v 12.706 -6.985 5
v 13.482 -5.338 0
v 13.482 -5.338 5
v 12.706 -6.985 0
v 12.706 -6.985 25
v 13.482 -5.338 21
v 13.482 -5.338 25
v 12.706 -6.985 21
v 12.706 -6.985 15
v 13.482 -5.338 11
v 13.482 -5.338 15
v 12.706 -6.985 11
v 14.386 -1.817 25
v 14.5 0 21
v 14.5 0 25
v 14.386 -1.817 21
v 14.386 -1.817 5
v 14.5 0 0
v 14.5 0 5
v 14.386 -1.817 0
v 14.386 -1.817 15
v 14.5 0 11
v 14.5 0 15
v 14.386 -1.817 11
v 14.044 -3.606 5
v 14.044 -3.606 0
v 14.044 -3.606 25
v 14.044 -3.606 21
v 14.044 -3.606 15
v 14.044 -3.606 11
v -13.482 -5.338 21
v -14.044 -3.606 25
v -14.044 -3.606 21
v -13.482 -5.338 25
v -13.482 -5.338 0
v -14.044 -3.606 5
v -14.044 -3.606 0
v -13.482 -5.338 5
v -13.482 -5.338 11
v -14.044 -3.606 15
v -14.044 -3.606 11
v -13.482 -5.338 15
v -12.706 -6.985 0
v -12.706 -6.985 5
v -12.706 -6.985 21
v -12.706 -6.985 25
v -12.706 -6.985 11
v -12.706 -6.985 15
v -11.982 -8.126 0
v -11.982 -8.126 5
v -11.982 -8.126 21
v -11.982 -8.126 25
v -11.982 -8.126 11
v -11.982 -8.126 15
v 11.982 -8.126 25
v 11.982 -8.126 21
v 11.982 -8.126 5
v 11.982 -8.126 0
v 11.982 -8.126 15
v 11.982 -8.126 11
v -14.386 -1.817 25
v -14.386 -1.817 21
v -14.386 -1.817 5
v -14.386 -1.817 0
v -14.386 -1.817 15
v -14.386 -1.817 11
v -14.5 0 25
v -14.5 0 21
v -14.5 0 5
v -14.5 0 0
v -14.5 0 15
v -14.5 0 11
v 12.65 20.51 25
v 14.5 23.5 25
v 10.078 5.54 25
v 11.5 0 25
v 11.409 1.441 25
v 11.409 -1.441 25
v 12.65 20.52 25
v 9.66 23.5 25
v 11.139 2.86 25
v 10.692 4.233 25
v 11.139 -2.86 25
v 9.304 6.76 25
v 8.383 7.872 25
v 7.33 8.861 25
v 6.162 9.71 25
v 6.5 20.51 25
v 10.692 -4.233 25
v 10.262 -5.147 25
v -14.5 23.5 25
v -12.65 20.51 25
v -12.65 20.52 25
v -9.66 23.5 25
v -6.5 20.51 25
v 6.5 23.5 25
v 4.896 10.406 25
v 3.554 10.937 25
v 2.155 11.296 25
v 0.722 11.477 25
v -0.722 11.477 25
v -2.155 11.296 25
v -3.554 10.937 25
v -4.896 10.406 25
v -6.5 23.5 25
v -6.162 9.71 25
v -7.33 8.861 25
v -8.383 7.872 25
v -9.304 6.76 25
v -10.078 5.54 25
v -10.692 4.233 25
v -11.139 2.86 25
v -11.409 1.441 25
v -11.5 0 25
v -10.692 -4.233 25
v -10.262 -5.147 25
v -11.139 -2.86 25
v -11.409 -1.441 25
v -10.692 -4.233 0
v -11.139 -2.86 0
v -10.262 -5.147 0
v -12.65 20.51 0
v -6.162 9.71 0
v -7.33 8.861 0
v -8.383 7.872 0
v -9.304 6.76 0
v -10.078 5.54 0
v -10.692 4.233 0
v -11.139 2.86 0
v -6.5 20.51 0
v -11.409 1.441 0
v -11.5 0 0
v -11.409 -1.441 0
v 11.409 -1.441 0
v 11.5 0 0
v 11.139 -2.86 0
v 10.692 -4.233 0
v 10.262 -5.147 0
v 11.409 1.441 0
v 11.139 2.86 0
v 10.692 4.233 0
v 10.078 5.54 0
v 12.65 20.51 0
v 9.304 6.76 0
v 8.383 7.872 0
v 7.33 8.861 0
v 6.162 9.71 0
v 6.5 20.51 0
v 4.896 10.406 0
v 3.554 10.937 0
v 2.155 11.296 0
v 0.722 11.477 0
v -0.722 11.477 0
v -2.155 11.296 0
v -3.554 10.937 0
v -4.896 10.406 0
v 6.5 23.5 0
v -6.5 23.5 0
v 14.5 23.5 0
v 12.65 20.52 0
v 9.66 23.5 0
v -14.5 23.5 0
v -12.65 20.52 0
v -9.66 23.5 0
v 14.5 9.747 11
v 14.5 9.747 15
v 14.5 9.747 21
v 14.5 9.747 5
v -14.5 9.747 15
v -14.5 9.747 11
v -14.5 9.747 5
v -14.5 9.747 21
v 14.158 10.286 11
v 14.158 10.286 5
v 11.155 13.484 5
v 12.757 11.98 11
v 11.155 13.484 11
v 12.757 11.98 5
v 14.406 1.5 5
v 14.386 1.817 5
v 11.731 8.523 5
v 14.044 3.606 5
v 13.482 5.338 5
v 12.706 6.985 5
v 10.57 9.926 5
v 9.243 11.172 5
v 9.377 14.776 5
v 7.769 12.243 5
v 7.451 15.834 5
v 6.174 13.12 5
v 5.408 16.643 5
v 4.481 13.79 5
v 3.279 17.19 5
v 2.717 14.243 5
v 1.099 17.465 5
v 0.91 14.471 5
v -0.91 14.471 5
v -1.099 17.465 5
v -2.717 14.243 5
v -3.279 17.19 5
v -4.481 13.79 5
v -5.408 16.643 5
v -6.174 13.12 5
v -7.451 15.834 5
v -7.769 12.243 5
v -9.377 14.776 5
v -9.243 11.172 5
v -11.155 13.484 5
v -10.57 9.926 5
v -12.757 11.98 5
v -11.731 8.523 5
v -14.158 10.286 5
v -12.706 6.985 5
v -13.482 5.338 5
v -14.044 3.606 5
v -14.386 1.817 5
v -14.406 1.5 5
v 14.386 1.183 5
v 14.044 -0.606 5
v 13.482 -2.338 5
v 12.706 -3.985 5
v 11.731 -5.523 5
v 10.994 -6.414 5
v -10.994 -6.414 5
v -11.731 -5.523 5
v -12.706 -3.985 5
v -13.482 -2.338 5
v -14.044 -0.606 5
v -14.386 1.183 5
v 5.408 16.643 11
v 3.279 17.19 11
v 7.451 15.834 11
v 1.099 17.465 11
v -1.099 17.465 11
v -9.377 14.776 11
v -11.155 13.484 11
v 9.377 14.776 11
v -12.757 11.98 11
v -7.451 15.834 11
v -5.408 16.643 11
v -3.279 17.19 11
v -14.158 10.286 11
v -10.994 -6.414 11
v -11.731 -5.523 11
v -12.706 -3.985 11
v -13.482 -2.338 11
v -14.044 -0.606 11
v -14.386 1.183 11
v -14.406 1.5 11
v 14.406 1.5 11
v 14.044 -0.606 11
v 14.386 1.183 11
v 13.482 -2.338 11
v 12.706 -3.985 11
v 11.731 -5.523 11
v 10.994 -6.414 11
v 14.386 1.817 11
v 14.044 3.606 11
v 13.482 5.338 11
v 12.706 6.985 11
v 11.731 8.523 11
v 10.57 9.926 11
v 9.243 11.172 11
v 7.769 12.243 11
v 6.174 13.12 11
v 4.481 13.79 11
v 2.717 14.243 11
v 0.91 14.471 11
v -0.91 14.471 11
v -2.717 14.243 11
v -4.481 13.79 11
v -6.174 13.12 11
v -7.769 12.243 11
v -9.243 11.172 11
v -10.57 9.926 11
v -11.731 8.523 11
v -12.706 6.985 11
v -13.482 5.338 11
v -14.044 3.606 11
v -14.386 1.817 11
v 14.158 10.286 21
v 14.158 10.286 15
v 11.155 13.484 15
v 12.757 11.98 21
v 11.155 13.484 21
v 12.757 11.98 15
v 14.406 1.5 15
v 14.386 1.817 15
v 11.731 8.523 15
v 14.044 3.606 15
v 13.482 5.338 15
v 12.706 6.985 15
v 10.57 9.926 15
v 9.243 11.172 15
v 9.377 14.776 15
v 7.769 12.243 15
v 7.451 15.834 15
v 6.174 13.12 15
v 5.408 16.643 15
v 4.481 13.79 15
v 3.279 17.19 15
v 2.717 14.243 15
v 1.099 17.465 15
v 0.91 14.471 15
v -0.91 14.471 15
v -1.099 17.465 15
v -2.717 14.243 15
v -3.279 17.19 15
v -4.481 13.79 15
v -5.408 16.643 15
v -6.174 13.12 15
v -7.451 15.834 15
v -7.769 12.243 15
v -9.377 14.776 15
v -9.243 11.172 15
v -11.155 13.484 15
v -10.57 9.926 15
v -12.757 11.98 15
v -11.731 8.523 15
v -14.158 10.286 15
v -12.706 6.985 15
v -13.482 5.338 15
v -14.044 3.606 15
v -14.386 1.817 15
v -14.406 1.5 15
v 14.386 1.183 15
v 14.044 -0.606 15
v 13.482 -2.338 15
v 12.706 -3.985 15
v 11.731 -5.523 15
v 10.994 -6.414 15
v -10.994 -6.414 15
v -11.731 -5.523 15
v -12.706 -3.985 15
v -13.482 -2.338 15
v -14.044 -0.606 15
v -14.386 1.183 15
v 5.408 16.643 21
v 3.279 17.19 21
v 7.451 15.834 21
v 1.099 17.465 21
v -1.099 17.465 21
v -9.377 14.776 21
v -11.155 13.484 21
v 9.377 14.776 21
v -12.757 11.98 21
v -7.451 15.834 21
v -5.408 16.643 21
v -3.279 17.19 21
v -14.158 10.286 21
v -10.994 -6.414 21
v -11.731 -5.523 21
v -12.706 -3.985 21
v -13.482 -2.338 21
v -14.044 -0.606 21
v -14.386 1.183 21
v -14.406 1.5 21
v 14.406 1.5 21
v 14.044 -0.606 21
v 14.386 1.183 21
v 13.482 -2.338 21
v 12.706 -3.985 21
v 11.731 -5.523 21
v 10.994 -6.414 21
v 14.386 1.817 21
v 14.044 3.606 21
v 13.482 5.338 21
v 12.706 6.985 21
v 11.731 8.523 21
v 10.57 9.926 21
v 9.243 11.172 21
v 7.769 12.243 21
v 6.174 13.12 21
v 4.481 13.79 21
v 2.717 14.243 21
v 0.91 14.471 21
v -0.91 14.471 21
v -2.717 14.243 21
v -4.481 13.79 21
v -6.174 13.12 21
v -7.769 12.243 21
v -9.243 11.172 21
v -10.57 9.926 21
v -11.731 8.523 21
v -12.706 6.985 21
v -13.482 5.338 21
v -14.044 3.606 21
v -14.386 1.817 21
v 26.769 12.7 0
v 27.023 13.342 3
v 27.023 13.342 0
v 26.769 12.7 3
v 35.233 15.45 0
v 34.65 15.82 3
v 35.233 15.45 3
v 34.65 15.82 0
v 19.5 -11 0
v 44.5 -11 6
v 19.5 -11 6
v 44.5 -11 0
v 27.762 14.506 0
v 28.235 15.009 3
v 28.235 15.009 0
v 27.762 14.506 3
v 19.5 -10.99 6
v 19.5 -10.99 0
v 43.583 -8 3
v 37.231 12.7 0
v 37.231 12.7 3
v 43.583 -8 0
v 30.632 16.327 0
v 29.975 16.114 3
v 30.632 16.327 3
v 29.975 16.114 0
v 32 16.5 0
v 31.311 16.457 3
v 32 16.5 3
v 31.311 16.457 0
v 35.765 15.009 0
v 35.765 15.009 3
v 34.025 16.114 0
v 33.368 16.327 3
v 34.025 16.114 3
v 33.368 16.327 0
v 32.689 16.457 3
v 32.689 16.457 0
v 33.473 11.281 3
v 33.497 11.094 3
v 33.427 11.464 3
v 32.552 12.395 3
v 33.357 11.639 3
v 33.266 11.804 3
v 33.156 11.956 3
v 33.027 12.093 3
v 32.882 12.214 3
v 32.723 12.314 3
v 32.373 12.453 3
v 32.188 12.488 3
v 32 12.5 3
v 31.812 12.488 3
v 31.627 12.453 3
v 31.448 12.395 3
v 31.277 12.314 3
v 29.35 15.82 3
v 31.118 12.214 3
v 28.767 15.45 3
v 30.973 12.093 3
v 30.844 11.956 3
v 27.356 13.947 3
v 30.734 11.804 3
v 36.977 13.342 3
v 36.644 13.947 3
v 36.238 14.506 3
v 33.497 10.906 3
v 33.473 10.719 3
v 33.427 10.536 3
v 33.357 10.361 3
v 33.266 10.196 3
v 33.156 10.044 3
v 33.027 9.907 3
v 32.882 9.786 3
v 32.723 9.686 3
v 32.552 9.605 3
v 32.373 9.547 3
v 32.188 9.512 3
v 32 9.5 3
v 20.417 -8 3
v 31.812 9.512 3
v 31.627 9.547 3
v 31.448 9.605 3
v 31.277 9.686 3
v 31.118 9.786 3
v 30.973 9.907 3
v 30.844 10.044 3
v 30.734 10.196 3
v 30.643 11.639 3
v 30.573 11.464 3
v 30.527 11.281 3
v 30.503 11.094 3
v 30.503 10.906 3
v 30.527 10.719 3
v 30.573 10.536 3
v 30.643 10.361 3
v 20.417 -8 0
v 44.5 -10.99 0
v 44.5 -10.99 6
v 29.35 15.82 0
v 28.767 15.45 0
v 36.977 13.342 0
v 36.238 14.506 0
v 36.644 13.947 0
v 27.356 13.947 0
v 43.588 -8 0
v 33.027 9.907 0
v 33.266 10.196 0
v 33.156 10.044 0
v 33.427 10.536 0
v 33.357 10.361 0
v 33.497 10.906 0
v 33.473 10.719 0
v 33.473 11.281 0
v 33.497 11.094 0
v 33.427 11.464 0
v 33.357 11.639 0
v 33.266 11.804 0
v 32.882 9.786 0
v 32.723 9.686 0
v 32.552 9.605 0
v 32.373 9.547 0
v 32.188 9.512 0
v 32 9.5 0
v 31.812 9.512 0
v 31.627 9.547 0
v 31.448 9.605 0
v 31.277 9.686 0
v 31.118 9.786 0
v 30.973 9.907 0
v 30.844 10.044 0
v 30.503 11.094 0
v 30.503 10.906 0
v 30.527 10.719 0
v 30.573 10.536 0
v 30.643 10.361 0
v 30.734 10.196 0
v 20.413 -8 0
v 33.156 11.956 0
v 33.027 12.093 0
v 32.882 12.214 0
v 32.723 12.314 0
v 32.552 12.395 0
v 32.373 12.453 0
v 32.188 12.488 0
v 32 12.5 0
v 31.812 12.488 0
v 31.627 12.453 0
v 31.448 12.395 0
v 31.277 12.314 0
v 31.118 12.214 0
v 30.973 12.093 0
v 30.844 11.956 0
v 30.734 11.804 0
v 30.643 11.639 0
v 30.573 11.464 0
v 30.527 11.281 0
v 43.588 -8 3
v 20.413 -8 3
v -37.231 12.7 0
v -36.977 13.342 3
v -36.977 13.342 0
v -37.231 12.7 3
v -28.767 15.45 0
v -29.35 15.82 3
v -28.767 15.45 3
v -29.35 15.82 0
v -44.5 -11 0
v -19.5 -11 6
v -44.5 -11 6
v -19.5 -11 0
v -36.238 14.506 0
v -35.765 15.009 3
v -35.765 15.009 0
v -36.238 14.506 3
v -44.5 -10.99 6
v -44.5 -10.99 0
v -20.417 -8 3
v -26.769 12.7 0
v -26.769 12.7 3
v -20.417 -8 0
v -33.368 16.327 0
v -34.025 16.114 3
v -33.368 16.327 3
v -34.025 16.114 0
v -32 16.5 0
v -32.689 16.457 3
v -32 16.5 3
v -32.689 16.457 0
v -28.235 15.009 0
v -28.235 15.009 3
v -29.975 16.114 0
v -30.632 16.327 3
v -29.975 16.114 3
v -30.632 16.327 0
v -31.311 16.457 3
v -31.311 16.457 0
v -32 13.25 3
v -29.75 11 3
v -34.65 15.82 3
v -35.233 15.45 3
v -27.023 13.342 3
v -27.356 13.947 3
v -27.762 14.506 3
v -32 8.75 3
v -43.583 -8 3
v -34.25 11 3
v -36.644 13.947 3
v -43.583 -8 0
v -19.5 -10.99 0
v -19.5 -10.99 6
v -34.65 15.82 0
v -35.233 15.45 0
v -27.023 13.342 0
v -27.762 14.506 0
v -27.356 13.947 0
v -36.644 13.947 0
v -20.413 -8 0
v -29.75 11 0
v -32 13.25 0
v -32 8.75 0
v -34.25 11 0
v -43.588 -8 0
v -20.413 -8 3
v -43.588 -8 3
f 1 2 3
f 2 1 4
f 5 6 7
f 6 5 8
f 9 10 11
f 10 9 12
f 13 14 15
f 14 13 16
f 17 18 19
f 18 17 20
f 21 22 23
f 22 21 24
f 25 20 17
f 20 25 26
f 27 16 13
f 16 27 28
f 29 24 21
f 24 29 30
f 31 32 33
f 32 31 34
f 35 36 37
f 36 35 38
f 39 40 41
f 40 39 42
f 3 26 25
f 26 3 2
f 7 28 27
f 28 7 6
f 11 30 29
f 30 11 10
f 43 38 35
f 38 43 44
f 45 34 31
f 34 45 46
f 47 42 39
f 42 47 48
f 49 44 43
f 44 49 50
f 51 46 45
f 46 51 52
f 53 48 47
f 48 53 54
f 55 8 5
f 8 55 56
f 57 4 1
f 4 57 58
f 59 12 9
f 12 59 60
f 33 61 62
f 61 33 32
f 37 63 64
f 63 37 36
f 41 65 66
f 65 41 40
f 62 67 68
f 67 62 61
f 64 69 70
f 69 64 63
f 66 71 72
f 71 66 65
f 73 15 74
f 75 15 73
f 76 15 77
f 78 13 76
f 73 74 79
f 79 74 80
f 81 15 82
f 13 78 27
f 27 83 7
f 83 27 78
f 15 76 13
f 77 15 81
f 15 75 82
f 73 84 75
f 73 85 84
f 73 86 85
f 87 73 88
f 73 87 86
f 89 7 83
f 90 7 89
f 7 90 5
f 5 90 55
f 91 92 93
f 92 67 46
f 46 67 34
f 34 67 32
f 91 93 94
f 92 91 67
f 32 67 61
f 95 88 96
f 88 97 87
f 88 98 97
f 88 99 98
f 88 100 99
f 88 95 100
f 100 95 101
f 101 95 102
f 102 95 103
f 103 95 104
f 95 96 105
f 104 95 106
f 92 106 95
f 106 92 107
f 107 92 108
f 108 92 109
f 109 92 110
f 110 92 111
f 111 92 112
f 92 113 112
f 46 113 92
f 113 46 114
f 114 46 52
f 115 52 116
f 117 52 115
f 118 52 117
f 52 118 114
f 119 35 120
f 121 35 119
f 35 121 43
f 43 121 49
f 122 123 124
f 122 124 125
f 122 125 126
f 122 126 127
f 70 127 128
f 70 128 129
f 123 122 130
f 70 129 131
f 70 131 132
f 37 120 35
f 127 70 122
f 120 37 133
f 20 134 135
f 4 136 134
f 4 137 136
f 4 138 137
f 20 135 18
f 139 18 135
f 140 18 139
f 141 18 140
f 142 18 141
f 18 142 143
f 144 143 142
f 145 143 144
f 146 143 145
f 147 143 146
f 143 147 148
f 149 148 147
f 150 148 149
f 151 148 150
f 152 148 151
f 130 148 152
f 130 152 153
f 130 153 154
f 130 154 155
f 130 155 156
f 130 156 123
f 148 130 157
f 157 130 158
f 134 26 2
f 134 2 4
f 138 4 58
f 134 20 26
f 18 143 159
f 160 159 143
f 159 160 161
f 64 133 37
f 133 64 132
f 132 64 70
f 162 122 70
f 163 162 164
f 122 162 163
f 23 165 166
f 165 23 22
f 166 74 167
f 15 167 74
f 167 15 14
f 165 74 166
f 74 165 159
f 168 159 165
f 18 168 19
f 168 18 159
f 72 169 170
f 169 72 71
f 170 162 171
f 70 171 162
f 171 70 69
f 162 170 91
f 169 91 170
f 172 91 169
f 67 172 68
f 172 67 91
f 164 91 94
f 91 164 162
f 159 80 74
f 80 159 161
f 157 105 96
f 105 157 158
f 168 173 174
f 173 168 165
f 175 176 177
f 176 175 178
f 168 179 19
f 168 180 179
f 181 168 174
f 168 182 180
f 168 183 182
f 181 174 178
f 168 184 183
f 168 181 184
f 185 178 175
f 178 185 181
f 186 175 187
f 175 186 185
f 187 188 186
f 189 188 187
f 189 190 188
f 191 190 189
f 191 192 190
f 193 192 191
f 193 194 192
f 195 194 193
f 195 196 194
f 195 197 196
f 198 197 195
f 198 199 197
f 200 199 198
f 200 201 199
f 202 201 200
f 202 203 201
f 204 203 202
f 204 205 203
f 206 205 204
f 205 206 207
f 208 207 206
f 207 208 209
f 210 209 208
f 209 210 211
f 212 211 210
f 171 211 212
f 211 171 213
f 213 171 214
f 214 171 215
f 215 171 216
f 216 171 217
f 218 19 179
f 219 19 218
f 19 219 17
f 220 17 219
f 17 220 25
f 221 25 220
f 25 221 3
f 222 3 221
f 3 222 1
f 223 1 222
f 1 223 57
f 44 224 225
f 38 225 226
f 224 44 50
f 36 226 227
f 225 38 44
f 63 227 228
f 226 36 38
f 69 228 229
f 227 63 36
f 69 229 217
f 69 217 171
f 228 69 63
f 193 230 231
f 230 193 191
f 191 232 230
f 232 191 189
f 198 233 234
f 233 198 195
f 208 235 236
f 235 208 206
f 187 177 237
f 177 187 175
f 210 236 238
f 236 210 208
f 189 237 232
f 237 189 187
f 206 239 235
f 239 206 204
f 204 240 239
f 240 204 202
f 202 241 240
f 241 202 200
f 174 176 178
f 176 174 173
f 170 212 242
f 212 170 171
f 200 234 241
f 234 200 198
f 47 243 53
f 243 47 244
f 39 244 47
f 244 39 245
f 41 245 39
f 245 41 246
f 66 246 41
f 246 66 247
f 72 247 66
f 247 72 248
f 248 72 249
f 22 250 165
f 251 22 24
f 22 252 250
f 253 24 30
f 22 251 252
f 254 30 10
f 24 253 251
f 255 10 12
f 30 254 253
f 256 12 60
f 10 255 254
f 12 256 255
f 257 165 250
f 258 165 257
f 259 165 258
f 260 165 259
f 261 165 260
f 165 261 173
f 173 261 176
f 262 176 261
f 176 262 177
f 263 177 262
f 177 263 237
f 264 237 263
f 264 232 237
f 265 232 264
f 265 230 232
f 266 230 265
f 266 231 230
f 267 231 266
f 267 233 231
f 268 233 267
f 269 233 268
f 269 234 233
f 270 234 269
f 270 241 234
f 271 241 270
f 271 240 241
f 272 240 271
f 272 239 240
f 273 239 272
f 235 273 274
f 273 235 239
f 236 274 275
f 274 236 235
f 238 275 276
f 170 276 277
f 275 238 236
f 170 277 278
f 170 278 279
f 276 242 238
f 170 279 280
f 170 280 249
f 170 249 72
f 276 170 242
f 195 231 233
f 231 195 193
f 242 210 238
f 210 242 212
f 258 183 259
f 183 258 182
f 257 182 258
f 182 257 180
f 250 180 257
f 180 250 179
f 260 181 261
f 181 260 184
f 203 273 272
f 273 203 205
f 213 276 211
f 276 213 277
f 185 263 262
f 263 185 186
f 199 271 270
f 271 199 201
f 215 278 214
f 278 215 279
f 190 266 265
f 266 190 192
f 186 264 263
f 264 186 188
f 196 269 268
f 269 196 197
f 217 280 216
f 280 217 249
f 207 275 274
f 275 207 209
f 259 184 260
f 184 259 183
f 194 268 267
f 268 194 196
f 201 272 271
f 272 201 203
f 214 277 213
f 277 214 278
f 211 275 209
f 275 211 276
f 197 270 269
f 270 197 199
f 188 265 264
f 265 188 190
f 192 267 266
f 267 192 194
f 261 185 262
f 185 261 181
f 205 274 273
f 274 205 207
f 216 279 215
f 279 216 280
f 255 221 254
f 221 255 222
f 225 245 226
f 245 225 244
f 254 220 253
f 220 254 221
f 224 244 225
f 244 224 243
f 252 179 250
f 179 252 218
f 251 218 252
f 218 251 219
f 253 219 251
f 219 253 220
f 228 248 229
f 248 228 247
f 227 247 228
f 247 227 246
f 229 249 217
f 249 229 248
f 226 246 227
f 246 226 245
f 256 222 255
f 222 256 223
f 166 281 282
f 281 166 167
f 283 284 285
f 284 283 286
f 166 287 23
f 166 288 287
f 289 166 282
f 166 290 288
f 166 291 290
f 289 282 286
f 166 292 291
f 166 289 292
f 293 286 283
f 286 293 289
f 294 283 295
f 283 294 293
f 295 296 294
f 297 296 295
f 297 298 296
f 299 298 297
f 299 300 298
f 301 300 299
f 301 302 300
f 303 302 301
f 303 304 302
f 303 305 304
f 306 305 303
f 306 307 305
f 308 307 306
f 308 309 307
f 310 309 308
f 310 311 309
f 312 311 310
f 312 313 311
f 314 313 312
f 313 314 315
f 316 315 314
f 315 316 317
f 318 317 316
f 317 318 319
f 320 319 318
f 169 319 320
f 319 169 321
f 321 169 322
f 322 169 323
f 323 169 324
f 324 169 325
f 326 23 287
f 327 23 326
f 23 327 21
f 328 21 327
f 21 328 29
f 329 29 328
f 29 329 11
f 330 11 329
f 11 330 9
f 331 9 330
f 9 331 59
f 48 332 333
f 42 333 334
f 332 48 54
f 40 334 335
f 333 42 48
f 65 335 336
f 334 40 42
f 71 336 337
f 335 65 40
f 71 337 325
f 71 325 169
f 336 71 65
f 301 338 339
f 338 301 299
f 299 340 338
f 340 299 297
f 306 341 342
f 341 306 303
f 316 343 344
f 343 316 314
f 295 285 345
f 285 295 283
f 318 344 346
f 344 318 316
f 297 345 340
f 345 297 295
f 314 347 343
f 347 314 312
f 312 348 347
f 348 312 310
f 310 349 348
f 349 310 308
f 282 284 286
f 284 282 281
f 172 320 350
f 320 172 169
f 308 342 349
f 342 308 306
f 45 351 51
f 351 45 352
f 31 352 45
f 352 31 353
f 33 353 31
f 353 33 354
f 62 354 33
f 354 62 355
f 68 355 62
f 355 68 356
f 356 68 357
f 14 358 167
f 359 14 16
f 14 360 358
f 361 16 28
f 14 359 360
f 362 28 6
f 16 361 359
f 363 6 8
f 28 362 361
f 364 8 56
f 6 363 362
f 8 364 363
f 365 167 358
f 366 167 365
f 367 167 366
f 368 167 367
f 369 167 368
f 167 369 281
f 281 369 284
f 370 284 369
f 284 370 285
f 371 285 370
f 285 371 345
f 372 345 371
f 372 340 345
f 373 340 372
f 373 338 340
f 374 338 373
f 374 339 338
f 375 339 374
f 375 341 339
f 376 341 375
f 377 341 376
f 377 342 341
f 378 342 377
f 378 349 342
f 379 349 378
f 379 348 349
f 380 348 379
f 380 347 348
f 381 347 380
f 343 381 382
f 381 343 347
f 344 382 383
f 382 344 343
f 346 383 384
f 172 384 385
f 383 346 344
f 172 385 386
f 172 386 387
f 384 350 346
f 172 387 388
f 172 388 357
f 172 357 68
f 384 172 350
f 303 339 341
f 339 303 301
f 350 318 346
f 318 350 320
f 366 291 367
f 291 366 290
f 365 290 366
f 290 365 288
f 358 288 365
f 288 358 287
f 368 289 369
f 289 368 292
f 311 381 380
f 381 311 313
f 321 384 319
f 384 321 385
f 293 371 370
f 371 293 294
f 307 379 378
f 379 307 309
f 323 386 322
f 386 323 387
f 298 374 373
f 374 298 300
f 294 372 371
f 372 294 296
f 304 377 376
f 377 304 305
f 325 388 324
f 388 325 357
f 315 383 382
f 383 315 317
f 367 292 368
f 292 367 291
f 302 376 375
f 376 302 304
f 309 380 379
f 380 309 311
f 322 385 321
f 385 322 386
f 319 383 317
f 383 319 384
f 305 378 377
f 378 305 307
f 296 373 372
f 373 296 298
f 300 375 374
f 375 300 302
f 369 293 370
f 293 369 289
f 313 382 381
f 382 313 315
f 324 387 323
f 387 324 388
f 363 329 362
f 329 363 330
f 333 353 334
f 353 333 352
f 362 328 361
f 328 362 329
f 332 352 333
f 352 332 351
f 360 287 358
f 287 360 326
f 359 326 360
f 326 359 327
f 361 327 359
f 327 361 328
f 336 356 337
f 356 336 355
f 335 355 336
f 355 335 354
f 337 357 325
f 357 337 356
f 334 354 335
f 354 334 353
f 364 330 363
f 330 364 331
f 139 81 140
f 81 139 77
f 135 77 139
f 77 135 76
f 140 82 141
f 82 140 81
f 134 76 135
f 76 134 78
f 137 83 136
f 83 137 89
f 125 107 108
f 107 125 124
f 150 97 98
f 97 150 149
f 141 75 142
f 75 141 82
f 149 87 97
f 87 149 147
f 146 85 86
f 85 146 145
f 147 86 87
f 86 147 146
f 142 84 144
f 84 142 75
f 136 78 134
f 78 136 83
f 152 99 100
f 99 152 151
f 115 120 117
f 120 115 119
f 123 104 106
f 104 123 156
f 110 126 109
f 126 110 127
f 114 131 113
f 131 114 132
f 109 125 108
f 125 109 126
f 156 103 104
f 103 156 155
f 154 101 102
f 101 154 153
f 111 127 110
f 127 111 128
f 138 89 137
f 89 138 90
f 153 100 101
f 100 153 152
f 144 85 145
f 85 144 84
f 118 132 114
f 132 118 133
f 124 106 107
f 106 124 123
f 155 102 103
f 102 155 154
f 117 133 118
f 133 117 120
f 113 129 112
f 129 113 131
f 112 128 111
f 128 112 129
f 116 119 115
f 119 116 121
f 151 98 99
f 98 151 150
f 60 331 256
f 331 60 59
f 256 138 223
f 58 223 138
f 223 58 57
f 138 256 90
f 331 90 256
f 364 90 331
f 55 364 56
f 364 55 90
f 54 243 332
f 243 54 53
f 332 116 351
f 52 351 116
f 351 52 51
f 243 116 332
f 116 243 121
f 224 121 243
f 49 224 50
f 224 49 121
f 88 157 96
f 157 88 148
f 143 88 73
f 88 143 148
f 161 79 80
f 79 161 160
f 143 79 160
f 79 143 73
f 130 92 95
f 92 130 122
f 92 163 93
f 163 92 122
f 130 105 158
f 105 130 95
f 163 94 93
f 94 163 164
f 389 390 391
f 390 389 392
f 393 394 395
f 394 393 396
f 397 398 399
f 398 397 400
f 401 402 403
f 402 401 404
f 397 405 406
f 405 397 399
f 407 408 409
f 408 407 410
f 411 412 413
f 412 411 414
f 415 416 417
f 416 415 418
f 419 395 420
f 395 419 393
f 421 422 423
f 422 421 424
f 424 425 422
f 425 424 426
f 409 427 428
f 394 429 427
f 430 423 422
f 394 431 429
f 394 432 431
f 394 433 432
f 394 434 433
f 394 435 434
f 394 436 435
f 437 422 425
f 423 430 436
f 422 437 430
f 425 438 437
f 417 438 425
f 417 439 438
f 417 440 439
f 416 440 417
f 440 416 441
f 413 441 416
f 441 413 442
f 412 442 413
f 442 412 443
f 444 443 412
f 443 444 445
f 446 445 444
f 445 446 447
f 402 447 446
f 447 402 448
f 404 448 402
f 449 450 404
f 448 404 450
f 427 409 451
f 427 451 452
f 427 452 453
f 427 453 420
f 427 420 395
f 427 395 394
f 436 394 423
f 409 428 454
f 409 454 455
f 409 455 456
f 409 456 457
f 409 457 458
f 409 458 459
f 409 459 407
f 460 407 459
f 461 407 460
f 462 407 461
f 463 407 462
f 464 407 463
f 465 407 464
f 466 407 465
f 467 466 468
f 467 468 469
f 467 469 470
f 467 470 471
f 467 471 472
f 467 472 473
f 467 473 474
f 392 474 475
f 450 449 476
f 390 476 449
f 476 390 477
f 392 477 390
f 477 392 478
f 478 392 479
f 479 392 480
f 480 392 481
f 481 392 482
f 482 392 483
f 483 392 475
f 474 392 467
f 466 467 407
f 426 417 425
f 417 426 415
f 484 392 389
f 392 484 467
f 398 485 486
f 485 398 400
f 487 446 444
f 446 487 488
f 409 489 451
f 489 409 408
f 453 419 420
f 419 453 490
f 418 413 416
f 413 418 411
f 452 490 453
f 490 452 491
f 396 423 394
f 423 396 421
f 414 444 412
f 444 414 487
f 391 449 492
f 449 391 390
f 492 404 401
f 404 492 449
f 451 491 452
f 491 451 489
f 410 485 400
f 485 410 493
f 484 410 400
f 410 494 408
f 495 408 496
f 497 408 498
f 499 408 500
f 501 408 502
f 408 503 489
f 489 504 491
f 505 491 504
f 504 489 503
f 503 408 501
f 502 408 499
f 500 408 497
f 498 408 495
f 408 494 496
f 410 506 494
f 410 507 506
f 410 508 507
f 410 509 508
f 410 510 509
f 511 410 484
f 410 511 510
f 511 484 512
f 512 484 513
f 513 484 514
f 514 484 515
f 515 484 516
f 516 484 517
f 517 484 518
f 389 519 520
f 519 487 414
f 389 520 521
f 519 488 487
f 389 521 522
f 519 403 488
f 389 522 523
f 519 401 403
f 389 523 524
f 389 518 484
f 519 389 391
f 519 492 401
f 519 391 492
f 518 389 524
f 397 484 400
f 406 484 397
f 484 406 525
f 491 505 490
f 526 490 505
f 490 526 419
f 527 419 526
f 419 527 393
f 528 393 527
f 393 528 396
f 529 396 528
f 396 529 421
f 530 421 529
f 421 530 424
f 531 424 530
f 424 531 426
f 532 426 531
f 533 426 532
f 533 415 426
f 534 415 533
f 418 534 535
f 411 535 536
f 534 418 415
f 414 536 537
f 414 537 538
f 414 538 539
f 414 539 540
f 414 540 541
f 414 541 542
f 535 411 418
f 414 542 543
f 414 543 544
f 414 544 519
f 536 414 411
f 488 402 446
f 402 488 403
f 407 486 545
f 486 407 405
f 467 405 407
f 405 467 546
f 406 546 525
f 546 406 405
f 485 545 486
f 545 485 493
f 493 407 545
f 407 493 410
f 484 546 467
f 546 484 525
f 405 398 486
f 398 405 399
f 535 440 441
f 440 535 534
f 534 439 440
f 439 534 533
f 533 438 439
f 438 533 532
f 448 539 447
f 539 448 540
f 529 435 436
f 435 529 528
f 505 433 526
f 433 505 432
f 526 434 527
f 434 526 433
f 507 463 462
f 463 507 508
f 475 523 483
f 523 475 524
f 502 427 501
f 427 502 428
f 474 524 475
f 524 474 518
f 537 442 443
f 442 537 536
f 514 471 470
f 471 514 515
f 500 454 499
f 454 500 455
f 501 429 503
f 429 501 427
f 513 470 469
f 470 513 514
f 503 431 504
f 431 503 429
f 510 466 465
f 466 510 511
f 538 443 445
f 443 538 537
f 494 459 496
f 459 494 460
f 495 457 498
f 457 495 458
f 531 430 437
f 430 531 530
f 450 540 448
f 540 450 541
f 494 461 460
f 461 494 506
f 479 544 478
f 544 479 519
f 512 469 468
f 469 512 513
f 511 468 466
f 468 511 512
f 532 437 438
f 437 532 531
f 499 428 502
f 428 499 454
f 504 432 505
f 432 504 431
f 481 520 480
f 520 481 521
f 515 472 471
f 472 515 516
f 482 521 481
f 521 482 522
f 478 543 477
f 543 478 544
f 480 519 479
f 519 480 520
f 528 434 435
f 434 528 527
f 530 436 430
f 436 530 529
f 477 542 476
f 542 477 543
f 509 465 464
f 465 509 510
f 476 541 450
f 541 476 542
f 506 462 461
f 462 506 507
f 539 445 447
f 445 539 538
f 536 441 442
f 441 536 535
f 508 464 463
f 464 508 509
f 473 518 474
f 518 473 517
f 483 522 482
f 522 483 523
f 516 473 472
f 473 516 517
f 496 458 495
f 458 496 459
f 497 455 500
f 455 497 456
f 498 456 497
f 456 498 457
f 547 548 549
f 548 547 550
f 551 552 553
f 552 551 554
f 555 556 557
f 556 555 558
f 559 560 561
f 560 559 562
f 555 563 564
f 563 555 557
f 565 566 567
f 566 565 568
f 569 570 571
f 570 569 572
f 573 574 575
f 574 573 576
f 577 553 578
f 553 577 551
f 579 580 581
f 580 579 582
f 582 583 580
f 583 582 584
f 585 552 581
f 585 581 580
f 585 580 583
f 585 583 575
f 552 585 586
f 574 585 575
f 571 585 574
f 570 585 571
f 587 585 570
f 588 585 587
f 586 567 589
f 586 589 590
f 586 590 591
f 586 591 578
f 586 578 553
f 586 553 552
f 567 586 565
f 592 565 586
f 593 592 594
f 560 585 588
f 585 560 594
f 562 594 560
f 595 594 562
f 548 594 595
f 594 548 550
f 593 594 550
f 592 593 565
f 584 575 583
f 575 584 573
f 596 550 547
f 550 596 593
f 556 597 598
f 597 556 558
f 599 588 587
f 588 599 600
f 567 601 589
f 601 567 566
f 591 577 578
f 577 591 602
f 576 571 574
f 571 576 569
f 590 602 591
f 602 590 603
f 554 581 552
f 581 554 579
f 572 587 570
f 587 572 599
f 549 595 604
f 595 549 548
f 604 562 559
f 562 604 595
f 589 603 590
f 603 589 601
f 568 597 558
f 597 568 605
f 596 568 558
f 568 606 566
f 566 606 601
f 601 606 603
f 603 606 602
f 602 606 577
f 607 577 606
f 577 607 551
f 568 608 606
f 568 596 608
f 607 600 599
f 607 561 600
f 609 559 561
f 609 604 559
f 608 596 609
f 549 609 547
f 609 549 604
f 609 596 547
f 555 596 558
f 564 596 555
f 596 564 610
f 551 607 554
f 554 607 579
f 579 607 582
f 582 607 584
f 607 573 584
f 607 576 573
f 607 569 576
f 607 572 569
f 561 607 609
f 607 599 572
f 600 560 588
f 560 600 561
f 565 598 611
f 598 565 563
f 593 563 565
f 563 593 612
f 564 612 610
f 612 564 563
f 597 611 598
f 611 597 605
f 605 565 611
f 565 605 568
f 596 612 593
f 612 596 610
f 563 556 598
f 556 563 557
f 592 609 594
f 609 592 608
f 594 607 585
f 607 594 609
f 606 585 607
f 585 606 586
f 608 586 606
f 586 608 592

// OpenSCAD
/*
 * dash-cam mirror bracket
 * Replaces the suction cup on a ROVE R2-4K cam that eventually
 * fails from heat, even though it works relatively well for
 * a year or two.
 *
 * The clip for the mirror post is sized for the mirror in a 2020 Tundra
 */
preview=false;  // otherwise use print layout (separate parts)

mirrorPostDia=23;
mirrorClipWidth=25;
mirrorClipThickness=3;
mirrorClipBlockExtraHeight=9;
mirrorClipBlockWidth=mirrorPostDia+mirrorClipThickness*2;
mirrorClipBlockHeight=mirrorClipBlockWidth/2+mirrorClipBlockExtraHeight;

clampHingeBaseWidth=mirrorClipWidth;
clampHingeGapWidth=13;
clampHingeAxleHeight=22;
clampHingeAxleOuterDia=11;  // thumbscrew outer dia is 11.6
clampHingePlateThickness=3;
clampHingeAxleInnerDia=3;
//clampHingeNutInsetDia=8.75;
clampHingeSquareDia=4.5; // This is the diagonal, corner-to-corner

clampHingeDovetailDepth=clampHingePlateThickness;
clampHingeDovetailThickness=clampHingePlateThickness;
clampHingeSlotTolerance=0.15;

tieWrapWidth=6;
tieWrapThickness=3;


overlap=0.01;
$fn=50;

if (preview) {
    printPartClip();
    translate([0,mirrorClipBlockHeight-clampHingeDovetailDepth,clampHingeBaseWidth/2])
        mirror([1,0,0]) rotate([0,0,90])
            translate([0,clampHingeGapWidth/2,0]) // center gap on axis
                rotate([-90,0,0])  // turn sideways
        printPartAxlePlateLeft();
    translate([0,mirrorClipBlockHeight-clampHingeDovetailDepth,clampHingeBaseWidth/2])
        rotate([0,0,90])
            translate([0,clampHingeGapWidth/2,0]) // center gap on axis
                rotate([-90,0,0])  // turn sideways
                    printPartAxlePlateRight();
} else {
    spacing=5;
    printPartClip();
    translate([mirrorClipBlockWidth/2+clampHingeBaseWidth/2+spacing,-clampHingeAxleHeight/2,0]) rotate([0,0,90])
        printPartAxlePlateLeft();
    translate([-mirrorClipBlockWidth/2-clampHingeBaseWidth/2-spacing,-clampHingeAxleHeight/2,0]) rotate([0,0,90])
    printPartAxlePlateRight();

}

module printPartClip() {
    difference() {
        postClip(mirrorPostDia, mirrorClipWidth, mirrorClipThickness, mirrorClipBlockHeight, mirrorClipBlockWidth);
        // dovetail slot 1
        translate([clampHingeGapWidth/2,mirrorClipBlockHeight-clampHingeDovetailDepth+overlap,clampHingeBaseWidth/2]) rotate([-90,0,0])
            clampHingeDovetail(clampHingePlateThickness+clampHingeSlotTolerance, 
                clampHingeBaseWidth+2, 
                clampHingeDovetailThickness, 
                clampHingeDovetailDepth, 0, 0);
        // dovetail slot 2
        translate([-clampHingeGapWidth/2,mirrorClipBlockHeight-clampHingeDovetailDepth+overlap,clampHingeBaseWidth/2]) mirror([1,0,0]) rotate([-90,0,0])
            clampHingeDovetail(clampHingePlateThickness+clampHingeSlotTolerance, 
            clampHingeBaseWidth+2, 
            clampHingeDovetailThickness, 
            clampHingeDovetailDepth, 0, 0);
    }
}

module printPartAxlePlateRight() {
    clampHinge(clampHingeBaseWidth,clampHingeAxleHeight,
        clampHingeAxleOuterDia, clampHingePlateThickness,
        clampHingeAxleInnerDia, clampHingeSquareDia);
}

module printPartAxlePlateLeft() {
    clampHinge(clampHingeBaseWidth,clampHingeAxleHeight,
        clampHingeAxleOuterDia, clampHingePlateThickness,
        clampHingeAxleInnerDia, 0);
}

/*
 * This creates once side-plate for the hinge, If hingeSquareDia is not zero, the hole in the flange
 * will be cut square for the anti-rotation square-shaft portion of the axle bolt (just below the "head"),
 * carriage-bolt style.
 * Note: Design on ROVE is reversed from a fixed nut recess.  The thumbscrew has a nut embedded in it,
 * and the bolt/shaft does not rotate relative to the hinge.
 */
module clampHinge(baseWidth, axleHeight, axleOuterDia, plateThickness, 
        axleInnerDia, hingeSquareDia) {
    difference() {
        // screw (head with square insert) side
        union() {
            hull() {
                // axle (top) corner
                translate([axleHeight,0,0])
                    cylinder(d=axleOuterDia, h=plateThickness);
                translate([0,-baseWidth/2,0])
                    cube([overlap,overlap,plateThickness]);
                translate([0,baseWidth/2-overlap,0])
                    cube([overlap,overlap,plateThickness]);
            }
            // Dovetail insert 
            mirror([1,0,0]) rotate([0,-90,0])
                clampHingeDovetail(plateThickness, baseWidth, clampHingeDovetailThickness, clampHingeDovetailDepth, 0, 0.073);
        }
        // axle cut
        translate([axleHeight,0,-overlap])
            if (hingeSquareDia)
                cylinder(d=hingeSquareDia, h=plateThickness+overlap*3, $fn=4);
            else 
                cylinder(d=axleInnerDia, h=plateThickness+overlap*3);
    }
}

/**
 * Assembled centered along y-axis, in +x, +z quadrant
 * (overlaps thickness of the plate)
 */
module clampHingeDovetail(overlapThickness, baseWidth, rootThickness, edgeDepth, enlargementFactor=0, taperFactor) {
    translate([0,-baseWidth/2,0])
        hull() {
            // root/base (flat bottom side)
            cube([overlapThickness+rootThickness,baseWidth,overlap]);
            // Note: For now, this is narrowed so it won't protrude from the sides of the tapered plate
            // but this should probably be calculated instead of fixed.
            upperRootTrimAmount=baseWidth*taperFactor;
            // flat top side
            translate([0,upperRootTrimAmount/2,edgeDepth-overlap])
                cube([overlapThickness,baseWidth-upperRootTrimAmount,overlap]);
        }
}

module postClip(postDia, clipWidth, thickness, blockHeight, blockWidth) {
    
    echo("blockWidth calculated as: ", blockWidth);
    difference() {
        union() {
            cylinder(d=postDia+thickness*2, h=clipWidth);
            translate([-blockWidth/2,0,0])
                cube([blockWidth, blockHeight, clipWidth]);
        }
        // center
        translate([0,0,-overlap])
            cylinder(d=postDia, h=clipWidth+overlap*2);
        // side opening
        translate([0,-postDia*3/4,-overlap])
            cylinder(d=postDia*1.5, h=clipWidth+overlap*2, $fn=6);
        // tie-wrap cut 1
        translate([0,0,clipWidth/5]) 
            tieWrapCut(postDia, thickness, tieWrapThickness, tieWrapWidth);
        // tie-wrap cut 2
        translate([0,0,clipWidth*3/5])
            tieWrapCut(postDia, thickness, tieWrapThickness, tieWrapWidth);
    }
}

module tieWrapCut(postDia, thickness, tieWrapThickness, tieWrapWidth) {
    cutOuterDia=postDia+thickness*2+tieWrapThickness*2;
    difference() {
        cylinder(d=cutOuterDia, h=tieWrapWidth);
        translate([0,0,-overlap])
            cylinder(d=postDia+thickness*2, h=tieWrapWidth+overlap*2);
    }
    difference() {
        cylinder(d=postDia+thickness*2+tieWrapThickness*2, h=tieWrapWidth);
        translate([-cutOuterDia/2-overlap,tieWrapThickness,-overlap])
            cube([cutOuterDia+overlap*2,cutOuterDia,tieWrapWidth+overlap*2]);
        translate([0,tieWrapThickness,-overlap])
            cylinder(d=postDia+thickness*2, h=tieWrapWidth+overlap*2);
    }
}
